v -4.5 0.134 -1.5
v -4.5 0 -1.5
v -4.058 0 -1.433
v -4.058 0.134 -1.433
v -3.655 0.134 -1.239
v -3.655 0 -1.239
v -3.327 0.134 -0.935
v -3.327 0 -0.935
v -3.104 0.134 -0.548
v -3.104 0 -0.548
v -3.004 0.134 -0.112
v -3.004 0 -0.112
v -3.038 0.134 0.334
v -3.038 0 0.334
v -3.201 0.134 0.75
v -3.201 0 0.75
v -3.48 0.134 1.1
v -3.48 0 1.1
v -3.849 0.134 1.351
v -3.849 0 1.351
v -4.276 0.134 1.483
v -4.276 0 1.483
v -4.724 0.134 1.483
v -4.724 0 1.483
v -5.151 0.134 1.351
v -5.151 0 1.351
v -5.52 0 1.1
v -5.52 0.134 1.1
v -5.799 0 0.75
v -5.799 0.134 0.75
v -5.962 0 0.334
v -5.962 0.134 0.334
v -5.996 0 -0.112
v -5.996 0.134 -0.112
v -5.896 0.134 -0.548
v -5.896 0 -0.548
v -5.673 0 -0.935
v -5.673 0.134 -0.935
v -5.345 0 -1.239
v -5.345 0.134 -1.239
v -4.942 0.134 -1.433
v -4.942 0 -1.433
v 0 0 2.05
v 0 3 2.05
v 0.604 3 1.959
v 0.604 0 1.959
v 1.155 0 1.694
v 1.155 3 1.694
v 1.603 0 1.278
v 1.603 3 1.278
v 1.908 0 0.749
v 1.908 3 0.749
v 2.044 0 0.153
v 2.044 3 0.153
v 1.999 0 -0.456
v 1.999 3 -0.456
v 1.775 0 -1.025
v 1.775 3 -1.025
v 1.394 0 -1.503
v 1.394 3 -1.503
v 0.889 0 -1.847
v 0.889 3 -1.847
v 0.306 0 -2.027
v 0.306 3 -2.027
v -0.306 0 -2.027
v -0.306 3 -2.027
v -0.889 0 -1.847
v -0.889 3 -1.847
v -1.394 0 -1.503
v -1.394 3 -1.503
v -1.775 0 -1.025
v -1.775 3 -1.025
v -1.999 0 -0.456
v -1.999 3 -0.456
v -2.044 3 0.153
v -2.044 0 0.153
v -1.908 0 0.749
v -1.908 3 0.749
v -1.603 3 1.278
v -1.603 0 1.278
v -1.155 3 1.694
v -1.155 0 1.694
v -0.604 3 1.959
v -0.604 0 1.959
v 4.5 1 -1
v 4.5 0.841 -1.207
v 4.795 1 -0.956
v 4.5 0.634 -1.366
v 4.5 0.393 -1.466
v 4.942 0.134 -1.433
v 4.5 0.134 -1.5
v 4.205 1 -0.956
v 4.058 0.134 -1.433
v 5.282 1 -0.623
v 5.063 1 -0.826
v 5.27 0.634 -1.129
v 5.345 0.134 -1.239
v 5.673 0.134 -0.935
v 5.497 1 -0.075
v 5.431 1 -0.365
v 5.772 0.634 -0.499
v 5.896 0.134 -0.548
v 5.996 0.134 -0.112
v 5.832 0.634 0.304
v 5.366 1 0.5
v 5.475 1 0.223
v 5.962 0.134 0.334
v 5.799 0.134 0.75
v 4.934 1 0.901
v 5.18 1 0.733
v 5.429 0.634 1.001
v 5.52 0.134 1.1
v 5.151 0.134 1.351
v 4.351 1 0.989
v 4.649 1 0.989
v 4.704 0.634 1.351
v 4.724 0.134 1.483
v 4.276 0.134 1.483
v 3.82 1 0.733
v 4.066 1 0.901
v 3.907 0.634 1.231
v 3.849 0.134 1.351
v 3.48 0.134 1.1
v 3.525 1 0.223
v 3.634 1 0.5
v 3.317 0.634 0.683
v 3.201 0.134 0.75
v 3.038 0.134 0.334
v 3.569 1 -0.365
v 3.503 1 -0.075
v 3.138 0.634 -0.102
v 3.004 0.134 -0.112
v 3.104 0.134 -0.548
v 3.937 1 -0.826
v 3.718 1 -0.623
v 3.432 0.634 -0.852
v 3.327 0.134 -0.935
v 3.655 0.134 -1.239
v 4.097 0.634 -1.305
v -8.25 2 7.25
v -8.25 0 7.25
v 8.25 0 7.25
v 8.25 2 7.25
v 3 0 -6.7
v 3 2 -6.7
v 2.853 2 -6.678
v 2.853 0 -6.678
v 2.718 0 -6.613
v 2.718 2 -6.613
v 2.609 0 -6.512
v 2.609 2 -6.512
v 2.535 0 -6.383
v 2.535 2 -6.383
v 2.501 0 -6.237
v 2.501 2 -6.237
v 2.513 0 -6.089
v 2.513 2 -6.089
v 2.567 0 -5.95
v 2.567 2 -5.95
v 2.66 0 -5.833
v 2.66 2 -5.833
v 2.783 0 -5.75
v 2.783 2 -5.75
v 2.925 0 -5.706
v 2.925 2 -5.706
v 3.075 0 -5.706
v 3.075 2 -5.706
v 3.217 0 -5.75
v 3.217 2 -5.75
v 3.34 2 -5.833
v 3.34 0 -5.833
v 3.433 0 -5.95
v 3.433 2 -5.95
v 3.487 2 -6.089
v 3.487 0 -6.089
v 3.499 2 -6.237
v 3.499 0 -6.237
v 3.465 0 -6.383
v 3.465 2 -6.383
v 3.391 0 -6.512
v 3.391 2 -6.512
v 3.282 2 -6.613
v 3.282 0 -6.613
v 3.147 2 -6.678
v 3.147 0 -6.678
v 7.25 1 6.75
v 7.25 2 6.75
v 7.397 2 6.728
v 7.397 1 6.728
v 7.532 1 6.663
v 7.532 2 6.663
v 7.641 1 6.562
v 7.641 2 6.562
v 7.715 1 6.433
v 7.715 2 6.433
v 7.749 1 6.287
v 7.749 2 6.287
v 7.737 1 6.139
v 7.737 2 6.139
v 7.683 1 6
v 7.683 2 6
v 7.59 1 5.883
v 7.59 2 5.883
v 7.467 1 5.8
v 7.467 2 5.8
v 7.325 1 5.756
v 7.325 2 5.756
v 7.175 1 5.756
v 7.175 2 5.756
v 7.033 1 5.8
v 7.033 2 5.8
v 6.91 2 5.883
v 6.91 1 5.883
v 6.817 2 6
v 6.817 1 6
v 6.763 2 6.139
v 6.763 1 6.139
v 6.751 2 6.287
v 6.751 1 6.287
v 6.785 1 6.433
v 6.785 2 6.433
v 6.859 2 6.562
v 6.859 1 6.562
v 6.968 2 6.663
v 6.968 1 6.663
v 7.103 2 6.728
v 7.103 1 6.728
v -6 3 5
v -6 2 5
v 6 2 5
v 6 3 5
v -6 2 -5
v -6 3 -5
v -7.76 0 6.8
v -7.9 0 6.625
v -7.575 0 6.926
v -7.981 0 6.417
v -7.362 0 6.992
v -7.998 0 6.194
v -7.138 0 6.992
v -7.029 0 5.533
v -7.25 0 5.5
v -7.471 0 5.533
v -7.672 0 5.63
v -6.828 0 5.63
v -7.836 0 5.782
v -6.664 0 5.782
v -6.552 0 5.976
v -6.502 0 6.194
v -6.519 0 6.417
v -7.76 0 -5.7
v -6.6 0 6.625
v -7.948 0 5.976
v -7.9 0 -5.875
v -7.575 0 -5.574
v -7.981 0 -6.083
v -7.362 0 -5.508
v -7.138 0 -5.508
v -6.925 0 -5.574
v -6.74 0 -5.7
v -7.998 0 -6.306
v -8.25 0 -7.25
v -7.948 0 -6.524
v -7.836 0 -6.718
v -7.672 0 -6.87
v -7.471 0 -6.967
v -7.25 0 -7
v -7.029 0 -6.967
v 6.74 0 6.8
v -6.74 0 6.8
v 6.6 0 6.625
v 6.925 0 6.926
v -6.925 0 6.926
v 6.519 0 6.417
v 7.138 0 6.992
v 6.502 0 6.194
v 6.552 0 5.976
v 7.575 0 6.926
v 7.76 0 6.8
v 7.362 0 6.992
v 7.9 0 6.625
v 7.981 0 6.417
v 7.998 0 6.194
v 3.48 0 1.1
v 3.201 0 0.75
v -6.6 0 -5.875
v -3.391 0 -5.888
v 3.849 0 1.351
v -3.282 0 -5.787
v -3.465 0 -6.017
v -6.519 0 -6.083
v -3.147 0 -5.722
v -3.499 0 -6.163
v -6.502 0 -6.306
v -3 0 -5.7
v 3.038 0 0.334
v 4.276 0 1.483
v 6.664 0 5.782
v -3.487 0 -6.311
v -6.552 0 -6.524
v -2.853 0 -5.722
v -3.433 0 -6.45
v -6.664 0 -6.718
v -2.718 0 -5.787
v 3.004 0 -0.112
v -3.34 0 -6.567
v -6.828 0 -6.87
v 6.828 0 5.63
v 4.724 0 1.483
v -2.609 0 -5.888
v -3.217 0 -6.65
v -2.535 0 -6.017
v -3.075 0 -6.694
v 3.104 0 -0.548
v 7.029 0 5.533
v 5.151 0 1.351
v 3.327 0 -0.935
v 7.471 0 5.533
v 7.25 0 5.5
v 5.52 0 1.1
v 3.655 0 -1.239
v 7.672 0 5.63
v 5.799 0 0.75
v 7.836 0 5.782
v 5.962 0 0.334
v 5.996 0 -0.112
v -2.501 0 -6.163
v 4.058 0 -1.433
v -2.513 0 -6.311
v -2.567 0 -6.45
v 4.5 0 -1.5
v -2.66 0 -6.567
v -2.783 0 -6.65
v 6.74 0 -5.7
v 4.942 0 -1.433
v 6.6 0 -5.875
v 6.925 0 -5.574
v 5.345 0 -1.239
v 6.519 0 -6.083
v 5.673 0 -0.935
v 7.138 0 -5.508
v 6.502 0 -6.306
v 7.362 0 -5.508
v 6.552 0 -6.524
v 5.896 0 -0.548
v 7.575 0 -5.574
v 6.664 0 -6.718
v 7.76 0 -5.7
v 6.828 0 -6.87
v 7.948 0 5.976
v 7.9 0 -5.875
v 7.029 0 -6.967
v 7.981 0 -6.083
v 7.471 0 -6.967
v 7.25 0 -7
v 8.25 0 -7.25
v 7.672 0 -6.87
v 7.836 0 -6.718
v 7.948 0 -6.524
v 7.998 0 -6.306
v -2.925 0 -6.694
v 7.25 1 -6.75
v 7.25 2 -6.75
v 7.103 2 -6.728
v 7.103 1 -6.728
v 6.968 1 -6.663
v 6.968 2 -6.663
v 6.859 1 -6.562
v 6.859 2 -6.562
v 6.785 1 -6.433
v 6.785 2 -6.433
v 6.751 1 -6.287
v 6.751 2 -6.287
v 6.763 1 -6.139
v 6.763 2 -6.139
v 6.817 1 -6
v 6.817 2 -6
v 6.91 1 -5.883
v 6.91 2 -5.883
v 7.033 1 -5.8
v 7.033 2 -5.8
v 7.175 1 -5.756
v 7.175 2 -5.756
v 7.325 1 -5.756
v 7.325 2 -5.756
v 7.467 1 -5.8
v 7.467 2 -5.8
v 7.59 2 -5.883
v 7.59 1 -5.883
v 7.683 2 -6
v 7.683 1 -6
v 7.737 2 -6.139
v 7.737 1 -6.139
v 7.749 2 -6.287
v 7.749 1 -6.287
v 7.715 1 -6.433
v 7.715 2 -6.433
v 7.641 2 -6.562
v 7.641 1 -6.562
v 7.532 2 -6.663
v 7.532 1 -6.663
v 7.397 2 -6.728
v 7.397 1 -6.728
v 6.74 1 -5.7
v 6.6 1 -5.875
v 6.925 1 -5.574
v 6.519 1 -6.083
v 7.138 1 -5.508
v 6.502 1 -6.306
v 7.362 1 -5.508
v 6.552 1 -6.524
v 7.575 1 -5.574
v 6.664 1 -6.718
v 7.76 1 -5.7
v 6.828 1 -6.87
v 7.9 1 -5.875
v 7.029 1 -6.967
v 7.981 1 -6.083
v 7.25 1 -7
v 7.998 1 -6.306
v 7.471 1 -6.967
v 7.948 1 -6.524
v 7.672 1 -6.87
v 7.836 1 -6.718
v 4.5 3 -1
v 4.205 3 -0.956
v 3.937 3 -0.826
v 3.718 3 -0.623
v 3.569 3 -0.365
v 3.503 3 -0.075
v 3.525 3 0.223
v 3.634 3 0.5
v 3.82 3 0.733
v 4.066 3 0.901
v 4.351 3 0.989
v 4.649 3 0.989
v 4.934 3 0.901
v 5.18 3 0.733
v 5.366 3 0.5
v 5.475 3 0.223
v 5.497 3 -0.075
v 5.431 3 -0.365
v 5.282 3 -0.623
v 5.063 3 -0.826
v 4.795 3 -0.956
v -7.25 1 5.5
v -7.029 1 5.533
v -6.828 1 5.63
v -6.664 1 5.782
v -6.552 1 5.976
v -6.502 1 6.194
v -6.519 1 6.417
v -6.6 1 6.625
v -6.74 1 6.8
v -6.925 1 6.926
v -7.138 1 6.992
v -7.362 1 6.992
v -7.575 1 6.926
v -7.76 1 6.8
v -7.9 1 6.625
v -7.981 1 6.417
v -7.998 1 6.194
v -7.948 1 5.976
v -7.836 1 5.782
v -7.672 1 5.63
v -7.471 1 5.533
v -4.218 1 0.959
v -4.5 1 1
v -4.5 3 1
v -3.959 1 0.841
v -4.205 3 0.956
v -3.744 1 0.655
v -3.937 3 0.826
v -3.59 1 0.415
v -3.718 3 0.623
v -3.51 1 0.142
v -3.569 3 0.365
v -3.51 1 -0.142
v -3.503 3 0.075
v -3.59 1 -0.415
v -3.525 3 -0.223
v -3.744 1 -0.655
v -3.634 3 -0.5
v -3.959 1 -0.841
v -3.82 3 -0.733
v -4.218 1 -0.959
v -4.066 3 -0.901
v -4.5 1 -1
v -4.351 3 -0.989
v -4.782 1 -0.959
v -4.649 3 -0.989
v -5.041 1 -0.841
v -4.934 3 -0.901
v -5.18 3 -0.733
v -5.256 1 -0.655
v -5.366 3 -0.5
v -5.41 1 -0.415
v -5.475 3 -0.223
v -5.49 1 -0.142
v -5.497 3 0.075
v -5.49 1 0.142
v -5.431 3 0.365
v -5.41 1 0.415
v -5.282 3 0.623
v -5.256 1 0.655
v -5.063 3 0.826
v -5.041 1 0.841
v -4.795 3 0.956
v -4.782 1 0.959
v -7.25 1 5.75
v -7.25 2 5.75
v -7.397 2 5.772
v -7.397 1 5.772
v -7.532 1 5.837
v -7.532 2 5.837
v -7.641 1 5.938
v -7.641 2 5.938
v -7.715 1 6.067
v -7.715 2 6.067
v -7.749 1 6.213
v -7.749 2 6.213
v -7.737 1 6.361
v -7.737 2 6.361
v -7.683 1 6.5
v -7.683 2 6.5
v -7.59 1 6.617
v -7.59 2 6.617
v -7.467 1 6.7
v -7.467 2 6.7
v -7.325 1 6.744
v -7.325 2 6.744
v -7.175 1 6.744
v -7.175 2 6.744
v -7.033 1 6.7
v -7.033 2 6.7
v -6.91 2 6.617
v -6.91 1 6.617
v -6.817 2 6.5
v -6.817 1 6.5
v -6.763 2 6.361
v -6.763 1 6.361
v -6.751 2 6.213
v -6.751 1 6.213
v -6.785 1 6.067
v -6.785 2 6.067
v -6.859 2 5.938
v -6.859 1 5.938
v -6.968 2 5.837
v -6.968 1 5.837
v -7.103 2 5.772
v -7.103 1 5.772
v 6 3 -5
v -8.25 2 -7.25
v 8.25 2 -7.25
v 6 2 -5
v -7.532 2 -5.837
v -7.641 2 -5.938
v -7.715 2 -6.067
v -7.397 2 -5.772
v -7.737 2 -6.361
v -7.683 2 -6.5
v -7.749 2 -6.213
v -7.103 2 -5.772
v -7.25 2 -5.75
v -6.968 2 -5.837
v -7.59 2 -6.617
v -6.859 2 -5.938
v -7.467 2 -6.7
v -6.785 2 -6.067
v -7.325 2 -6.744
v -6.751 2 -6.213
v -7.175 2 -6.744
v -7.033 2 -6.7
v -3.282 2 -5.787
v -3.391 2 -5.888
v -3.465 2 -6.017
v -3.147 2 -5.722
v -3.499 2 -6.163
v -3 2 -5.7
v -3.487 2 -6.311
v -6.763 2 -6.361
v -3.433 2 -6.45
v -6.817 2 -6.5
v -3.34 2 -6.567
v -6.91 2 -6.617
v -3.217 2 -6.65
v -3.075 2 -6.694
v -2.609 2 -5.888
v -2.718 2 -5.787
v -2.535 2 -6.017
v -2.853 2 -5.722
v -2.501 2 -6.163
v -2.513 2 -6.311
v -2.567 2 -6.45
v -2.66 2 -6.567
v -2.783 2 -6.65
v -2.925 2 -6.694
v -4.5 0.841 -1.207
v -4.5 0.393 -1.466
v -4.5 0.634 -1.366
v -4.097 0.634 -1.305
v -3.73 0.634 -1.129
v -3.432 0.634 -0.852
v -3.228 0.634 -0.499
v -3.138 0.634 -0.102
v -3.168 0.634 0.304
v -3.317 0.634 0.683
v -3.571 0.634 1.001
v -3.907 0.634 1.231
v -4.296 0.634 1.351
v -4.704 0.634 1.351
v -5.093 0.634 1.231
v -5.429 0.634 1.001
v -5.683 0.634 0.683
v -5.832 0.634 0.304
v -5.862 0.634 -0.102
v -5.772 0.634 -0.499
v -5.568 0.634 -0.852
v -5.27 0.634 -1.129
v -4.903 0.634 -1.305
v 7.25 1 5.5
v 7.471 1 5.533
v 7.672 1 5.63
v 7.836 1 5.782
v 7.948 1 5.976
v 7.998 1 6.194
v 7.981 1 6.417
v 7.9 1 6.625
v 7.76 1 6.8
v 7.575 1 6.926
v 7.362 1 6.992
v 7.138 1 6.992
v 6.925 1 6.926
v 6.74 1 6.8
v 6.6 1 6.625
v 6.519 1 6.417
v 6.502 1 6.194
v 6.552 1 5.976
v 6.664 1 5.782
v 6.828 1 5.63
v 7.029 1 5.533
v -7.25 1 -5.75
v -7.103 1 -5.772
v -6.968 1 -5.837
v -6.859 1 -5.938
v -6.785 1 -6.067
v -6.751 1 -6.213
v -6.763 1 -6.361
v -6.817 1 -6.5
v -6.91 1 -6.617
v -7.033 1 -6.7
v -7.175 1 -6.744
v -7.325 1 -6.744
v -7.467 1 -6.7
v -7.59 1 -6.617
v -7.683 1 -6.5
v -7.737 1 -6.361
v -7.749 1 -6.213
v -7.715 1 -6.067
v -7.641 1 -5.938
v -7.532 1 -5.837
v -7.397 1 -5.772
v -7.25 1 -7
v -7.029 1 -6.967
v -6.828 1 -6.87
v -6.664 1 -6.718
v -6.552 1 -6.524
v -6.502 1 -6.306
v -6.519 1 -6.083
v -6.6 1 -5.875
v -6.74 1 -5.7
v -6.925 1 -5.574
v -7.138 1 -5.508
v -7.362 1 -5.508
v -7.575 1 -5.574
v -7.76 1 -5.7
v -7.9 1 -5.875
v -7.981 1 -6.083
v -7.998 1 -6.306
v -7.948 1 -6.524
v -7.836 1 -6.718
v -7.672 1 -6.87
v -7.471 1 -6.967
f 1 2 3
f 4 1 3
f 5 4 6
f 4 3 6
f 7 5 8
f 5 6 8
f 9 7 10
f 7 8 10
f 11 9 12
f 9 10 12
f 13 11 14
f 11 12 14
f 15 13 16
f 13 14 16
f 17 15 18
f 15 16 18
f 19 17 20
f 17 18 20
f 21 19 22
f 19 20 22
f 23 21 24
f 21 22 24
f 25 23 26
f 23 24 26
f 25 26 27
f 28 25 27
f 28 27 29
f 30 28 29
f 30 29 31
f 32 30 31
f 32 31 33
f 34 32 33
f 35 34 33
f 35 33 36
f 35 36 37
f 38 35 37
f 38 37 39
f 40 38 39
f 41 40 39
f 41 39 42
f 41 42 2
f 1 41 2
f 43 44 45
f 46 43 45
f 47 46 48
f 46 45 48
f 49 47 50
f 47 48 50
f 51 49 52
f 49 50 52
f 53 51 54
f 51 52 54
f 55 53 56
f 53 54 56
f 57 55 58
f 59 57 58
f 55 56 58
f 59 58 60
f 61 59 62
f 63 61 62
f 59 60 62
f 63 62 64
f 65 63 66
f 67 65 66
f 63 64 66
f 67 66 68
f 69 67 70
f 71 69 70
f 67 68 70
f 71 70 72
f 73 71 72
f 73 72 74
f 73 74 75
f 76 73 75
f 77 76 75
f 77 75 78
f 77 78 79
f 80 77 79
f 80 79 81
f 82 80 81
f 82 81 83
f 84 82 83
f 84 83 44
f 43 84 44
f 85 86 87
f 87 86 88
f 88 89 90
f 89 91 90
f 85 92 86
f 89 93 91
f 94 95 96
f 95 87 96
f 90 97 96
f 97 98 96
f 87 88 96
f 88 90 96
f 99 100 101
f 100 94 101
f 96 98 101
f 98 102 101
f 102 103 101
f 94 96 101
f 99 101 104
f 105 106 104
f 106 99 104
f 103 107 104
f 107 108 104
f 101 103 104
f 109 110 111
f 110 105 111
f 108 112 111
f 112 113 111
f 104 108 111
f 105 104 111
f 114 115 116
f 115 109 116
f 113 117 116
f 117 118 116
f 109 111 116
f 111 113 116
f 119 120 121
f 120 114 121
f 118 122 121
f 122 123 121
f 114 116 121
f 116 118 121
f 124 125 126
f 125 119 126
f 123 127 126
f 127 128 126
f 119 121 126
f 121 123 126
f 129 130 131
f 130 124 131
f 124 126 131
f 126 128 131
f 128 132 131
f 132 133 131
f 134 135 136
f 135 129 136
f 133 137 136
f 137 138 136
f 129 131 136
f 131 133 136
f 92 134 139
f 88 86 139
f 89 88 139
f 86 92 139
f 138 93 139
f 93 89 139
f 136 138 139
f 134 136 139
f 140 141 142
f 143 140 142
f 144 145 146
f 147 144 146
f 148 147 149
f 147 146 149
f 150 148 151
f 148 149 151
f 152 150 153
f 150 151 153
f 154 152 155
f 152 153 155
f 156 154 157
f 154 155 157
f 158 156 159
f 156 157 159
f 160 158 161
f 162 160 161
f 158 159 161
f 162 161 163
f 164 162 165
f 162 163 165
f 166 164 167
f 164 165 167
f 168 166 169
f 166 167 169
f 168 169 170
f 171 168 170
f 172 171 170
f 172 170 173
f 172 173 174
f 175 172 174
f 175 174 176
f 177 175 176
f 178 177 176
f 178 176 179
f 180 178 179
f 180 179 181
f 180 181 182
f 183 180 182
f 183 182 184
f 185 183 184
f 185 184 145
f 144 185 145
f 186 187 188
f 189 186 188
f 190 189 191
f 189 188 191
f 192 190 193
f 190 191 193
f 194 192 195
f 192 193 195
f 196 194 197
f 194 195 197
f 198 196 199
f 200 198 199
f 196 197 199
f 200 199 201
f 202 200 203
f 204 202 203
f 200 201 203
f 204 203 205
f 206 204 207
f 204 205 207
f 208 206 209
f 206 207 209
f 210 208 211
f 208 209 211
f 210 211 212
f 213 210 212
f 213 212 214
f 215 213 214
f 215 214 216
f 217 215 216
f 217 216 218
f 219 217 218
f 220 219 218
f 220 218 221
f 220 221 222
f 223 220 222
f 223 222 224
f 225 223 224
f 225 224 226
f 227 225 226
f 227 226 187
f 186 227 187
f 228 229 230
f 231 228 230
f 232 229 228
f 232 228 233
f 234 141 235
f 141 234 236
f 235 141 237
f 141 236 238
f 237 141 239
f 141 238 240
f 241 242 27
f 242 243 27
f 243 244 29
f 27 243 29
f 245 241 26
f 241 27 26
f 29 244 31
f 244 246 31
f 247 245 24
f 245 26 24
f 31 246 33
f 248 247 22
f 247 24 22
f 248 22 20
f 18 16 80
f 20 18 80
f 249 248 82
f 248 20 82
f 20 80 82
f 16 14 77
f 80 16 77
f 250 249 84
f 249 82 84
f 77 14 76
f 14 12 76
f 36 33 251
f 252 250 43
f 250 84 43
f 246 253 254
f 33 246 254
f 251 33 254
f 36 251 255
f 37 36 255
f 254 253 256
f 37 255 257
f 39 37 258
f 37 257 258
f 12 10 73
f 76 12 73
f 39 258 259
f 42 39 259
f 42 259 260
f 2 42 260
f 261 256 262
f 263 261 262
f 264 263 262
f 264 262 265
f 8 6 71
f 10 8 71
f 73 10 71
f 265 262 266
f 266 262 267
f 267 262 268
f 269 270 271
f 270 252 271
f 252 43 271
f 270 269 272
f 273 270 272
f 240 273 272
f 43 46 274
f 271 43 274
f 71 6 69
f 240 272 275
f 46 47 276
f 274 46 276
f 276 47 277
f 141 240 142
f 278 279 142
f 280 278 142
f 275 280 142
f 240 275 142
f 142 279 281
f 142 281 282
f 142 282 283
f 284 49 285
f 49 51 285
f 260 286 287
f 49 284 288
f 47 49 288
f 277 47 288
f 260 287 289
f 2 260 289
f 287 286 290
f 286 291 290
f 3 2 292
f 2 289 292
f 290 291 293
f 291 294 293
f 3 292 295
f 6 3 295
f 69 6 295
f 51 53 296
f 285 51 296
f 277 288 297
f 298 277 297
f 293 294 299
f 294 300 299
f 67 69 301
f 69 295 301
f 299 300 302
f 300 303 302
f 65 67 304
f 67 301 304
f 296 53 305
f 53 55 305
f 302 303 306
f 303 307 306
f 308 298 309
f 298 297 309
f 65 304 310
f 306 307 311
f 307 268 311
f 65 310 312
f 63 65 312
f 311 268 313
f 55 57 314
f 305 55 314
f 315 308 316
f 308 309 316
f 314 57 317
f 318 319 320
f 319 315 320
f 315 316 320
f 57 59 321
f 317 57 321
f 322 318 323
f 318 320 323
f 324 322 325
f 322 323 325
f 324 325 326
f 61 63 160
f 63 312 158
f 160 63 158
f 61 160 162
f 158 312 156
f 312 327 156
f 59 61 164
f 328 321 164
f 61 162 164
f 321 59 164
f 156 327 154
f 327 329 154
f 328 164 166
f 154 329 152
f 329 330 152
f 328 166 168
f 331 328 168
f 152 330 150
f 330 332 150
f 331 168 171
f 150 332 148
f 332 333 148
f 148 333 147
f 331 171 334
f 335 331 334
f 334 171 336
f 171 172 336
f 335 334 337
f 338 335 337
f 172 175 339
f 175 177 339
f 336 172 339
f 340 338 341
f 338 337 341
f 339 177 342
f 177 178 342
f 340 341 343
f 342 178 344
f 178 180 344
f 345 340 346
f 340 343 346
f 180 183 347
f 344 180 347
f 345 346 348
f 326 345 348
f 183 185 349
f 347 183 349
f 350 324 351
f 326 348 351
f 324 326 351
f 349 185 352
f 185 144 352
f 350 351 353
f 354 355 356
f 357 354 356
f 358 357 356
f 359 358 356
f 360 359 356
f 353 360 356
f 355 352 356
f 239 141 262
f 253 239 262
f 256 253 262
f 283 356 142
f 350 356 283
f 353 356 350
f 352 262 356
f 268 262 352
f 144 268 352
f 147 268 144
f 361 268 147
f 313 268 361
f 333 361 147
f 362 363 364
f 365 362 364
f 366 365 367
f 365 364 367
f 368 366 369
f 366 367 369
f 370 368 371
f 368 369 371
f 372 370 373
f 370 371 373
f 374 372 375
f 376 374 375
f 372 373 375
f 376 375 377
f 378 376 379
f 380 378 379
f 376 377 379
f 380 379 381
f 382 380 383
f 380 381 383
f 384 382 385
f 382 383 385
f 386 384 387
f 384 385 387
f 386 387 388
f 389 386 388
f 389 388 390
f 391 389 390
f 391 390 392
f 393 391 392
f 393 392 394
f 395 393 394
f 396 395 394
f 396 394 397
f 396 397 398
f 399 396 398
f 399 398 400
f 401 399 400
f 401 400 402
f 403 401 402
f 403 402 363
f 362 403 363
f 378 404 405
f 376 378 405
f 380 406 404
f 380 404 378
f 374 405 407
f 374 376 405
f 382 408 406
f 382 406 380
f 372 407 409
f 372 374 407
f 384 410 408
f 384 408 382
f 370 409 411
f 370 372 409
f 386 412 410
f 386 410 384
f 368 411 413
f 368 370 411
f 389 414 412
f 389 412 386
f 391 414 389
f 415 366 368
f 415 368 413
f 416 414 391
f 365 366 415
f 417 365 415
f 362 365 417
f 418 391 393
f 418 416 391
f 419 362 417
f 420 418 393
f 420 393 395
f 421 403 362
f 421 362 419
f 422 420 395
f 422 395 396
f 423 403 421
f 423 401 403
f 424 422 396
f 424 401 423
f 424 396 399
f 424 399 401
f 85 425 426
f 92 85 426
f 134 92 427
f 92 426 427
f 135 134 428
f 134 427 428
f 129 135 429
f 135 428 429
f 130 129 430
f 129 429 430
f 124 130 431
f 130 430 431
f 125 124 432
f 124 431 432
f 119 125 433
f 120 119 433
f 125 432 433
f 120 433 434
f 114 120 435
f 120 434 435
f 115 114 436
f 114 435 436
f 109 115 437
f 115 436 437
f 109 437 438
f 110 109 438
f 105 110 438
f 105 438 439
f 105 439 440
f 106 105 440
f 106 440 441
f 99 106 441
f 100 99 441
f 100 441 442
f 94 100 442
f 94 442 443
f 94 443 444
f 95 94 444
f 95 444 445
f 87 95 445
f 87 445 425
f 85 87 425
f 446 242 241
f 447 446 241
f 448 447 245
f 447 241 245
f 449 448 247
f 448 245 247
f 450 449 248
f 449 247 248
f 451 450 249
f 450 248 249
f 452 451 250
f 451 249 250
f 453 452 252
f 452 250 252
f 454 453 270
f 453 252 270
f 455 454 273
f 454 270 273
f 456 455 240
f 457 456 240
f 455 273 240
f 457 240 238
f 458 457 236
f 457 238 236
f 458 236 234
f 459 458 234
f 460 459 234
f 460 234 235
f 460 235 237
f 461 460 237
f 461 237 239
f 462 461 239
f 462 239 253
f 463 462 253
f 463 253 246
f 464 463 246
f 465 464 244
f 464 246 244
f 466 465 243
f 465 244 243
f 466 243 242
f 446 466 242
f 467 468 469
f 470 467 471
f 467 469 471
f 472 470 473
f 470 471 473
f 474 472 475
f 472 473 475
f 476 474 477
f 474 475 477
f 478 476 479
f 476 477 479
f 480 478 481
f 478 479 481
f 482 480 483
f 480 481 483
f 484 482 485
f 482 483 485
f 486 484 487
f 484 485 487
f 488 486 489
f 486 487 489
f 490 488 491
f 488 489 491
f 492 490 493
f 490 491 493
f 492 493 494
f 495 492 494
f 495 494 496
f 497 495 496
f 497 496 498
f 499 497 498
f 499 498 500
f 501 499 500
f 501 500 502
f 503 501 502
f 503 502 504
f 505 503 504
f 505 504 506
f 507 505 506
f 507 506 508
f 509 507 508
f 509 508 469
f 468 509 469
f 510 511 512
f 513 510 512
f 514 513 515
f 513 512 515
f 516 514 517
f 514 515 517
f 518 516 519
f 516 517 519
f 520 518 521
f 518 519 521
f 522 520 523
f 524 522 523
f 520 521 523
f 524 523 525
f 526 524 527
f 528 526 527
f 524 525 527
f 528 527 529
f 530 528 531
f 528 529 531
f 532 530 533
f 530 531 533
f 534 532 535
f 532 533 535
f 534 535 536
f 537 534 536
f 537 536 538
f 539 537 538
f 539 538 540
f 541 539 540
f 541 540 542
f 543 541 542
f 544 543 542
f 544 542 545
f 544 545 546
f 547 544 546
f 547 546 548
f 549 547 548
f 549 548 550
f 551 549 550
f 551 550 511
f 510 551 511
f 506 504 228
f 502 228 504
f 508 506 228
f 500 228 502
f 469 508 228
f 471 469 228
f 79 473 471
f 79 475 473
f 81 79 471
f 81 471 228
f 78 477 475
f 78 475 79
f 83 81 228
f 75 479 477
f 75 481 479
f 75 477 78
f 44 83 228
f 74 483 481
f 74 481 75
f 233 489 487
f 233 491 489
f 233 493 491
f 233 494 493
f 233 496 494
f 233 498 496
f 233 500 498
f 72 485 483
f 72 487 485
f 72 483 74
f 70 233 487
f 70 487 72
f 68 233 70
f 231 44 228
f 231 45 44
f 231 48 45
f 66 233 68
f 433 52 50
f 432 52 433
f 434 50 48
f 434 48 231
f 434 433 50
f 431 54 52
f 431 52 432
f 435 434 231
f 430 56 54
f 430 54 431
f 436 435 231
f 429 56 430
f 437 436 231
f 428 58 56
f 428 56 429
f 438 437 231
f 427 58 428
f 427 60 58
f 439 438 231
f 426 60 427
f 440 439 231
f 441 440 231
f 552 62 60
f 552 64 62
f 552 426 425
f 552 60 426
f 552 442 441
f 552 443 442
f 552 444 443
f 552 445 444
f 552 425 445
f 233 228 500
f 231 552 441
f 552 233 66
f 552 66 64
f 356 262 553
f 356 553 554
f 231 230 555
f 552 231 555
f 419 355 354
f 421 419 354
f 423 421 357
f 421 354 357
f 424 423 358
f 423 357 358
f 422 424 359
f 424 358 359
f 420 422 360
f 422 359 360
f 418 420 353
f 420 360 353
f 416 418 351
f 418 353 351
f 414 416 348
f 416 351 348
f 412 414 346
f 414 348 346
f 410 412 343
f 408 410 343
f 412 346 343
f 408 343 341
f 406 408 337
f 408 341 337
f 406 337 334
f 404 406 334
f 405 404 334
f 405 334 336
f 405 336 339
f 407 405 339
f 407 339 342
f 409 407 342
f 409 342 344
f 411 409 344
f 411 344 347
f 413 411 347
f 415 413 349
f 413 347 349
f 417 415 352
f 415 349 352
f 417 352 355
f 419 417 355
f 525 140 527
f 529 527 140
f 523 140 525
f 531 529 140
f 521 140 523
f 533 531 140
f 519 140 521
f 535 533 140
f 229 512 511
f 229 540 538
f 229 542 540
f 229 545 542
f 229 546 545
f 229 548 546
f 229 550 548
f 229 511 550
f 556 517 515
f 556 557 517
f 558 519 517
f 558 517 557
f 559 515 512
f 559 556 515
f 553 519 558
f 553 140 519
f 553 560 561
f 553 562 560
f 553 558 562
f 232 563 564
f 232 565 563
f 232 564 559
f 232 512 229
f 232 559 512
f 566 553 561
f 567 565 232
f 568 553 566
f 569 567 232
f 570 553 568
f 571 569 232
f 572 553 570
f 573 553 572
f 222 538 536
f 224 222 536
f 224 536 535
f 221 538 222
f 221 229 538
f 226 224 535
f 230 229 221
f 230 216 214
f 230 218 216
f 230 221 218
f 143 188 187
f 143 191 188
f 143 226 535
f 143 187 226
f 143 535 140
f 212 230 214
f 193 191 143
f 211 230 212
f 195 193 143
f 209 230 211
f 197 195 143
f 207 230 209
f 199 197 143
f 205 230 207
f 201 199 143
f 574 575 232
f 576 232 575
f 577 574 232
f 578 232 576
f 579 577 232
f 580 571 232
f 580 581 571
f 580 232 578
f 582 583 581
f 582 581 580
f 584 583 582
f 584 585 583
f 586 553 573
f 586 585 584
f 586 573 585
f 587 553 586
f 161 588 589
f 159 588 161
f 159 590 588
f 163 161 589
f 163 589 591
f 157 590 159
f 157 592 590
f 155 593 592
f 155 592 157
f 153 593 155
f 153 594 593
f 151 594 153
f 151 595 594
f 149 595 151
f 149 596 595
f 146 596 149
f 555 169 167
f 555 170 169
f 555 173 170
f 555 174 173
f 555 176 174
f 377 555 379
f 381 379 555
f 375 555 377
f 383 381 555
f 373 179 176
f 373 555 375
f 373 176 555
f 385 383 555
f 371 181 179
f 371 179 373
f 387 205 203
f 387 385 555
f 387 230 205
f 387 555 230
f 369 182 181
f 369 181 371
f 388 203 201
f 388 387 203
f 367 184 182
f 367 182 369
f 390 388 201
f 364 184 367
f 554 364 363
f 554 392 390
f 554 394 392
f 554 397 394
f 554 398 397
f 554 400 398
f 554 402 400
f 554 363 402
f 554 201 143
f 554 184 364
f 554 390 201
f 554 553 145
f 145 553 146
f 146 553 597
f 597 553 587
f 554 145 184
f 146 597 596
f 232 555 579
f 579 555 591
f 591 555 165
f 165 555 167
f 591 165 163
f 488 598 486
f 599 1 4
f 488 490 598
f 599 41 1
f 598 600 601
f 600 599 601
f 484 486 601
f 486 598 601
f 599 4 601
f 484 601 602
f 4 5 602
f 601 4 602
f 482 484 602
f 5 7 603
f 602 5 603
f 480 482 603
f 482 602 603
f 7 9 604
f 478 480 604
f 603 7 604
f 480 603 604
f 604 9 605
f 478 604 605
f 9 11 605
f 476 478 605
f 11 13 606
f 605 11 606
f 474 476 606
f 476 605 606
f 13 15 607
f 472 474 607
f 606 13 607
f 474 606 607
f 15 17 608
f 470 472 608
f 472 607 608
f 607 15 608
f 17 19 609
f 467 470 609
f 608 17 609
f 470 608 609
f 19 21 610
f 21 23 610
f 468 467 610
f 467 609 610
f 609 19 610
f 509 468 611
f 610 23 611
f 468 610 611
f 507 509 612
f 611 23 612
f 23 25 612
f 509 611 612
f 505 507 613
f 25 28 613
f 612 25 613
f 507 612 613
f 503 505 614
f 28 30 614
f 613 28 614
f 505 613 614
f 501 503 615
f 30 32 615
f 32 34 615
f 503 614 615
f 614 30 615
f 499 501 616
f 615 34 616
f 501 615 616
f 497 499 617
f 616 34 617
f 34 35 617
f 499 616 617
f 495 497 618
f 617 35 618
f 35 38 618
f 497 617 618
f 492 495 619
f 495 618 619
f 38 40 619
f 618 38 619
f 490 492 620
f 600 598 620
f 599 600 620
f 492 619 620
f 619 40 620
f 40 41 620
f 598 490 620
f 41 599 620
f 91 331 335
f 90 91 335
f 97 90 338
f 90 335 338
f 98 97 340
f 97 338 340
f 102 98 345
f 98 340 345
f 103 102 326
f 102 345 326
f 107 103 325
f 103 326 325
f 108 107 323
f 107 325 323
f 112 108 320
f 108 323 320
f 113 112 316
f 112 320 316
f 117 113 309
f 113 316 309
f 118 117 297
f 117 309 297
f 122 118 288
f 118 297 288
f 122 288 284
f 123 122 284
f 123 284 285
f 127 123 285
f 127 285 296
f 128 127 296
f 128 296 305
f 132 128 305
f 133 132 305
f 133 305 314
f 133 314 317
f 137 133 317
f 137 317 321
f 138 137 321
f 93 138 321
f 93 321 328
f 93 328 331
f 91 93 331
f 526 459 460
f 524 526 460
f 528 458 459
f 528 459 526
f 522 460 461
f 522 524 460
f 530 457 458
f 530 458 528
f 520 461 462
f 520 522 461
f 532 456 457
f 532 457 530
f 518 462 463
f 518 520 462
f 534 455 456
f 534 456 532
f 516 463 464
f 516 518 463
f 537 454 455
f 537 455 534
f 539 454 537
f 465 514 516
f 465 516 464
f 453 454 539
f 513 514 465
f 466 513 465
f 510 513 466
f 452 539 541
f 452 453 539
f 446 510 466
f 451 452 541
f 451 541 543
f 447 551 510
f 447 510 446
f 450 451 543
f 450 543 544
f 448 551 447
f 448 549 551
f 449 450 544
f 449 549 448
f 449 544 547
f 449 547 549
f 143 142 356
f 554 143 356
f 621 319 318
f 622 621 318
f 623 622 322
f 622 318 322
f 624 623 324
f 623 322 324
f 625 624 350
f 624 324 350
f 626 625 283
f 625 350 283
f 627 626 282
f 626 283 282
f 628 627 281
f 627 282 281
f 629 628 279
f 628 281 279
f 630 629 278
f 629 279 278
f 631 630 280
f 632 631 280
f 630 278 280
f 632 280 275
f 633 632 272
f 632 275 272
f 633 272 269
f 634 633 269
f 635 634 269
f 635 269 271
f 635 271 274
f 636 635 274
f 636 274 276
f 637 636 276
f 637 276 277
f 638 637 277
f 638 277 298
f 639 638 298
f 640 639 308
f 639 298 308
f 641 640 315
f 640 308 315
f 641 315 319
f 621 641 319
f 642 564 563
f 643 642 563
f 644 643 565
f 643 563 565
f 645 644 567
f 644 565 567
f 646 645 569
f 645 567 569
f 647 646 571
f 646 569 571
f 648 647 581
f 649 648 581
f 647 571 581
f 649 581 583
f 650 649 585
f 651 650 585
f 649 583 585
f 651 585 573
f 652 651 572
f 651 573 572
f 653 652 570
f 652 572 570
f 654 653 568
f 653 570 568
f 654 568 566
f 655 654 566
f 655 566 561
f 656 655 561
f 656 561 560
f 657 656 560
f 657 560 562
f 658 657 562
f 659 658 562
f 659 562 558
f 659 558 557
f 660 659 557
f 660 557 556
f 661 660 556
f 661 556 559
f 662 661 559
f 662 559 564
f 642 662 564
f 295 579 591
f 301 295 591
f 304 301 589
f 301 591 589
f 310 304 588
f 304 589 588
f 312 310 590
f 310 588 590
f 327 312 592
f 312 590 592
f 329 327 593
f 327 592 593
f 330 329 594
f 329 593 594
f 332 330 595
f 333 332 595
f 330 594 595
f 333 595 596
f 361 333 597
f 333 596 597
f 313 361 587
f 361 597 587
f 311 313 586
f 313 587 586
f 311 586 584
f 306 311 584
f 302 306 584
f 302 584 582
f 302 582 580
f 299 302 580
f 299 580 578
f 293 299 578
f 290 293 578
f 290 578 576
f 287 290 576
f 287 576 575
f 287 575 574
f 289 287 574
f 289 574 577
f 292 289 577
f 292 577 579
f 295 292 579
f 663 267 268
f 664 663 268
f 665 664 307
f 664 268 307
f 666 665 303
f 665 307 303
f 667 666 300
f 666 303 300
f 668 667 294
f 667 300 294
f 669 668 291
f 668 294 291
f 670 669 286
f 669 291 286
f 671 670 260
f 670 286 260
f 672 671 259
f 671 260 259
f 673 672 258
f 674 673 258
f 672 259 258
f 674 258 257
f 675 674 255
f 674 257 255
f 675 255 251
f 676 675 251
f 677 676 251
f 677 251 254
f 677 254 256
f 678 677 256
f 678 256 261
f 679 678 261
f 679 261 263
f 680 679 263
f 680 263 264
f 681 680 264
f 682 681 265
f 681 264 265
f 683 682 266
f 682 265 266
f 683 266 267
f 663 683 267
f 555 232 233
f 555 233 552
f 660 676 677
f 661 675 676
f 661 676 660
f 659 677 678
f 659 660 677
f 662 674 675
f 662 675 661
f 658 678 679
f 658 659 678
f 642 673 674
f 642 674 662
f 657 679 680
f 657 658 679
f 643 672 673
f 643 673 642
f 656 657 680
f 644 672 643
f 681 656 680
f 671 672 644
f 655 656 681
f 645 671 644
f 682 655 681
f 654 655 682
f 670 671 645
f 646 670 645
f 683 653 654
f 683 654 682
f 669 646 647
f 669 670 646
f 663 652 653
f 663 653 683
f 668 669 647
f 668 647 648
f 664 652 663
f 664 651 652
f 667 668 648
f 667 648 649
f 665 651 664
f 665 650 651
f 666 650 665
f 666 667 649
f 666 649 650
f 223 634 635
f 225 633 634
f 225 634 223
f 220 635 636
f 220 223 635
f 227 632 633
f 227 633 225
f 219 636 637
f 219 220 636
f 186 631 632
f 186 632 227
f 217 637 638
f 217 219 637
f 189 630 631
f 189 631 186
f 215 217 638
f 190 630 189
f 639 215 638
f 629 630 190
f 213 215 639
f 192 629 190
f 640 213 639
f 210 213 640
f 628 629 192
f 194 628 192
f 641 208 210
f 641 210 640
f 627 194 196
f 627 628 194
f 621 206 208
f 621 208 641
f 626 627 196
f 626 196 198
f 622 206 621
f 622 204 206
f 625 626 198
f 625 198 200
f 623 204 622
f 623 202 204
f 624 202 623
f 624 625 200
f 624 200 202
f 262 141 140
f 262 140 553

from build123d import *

# Parameters (mm, degrees)
SKETCH_1_W          = 16.5
SKETCH_1_H          = 14.5
EXTRUDE_1_DEPTH     = 2
SKETCH_2_W          = 12
SKETCH_2_H          = 10
EXTRUDE_2_DEPTH     = 1
SKETCH_3_R          = 0.5
CUT_EXTRUDE_1_DEPTH = 12.163556781
SKETCH_5_R          = 2.05
SKETCH_5_R_2        = 1
CUT_EXTRUDE_2_DEPTH = 12.385297537
SKETCH_6_R          = 0.75
CUT_EXTRUDE_3_DEPTH = 1
SKETCH_7_R          = 1.5
CUT_EXTRUDE_4_DEPTH = 1
FILLET_1_R          = 1
SKETCH_8_R          = 0.5
CUT_EXTRUDE_5_DEPTH = 12.163556781


with BuildPart() as part:
    # 草图1 → 凸台-拉伸1 (new body)
    with BuildSketch(Plane(origin=(0, 0, 0), x_dir=(1, 0, 0), z_dir=(0, 1, 0))):
        Rectangle(SKETCH_1_W, SKETCH_1_H)
    extrude(amount=EXTRUDE_1_DEPTH)

    # 草图2 → 凸台-拉伸2 (add)
    with BuildSketch(Plane(origin=(0, 2, 0), x_dir=(1, 0, 0), z_dir=(0, 1, 0))):
        Rectangle(SKETCH_2_W, SKETCH_2_H)
    extrude(amount=EXTRUDE_2_DEPTH)

    # 草图3 → 切除-拉伸1 (cut, through all)
    with BuildSketch(Plane(origin=(0, 2, 0), x_dir=(1, 0, 0), z_dir=(0, 1, 0))):
        with Locations(Location((-7.25, 6.25, 0), (0, 0, 270))):
            Circle(SKETCH_3_R)
        with Locations(Location((7.25, 6.25, 0), (0, 0, 90))):
            Circle(SKETCH_3_R)
        with Locations(Location((7.25, -6.25, 0), (0, 0, 270))):
            Circle(SKETCH_3_R)
        with Locations(Location((-7.25, -6.25, 0), (0, 0, 90))):
            Circle(SKETCH_3_R)
    extrude(amount=-CUT_EXTRUDE_1_DEPTH, mode=Mode.SUBTRACT)

    # 草图5 → 切除-拉伸2 (cut, through all)
    with BuildSketch(Plane(origin=(0, 3, 0), x_dir=(1, 0, 0), z_dir=(0, 1, 0))):
        with Locations(Location((0, 0, 0), (0, 0, 270))):
            Circle(SKETCH_5_R)
        with Locations(Location((-4.5, 0, 0), (0, 0, 270))):
            Circle(SKETCH_5_R_2)
        with Locations(Location((4.5, 0, 0), (0, 0, 90))):
            Circle(SKETCH_5_R_2)
    extrude(amount=-CUT_EXTRUDE_2_DEPTH, mode=Mode.SUBTRACT)

    # 草图6 → 切除-拉伸3 (cut)
    with BuildSketch(Plane.XZ):
        with Locations(Location((7.25, -6.25, 0), (0, 0, 270))):
            Circle(SKETCH_6_R)
        with Locations(Location((-7.25, -6.25, 0), (0, 0, 270))):
            Circle(SKETCH_6_R)
        with Locations(Location((7.25, 6.25, 0), (0, 0, 270))):
            Circle(SKETCH_6_R)
        with Locations(Location((-7.25, 6.25, 0), (0, 0, 270))):
            Circle(SKETCH_6_R)
    extrude(amount=-CUT_EXTRUDE_3_DEPTH, mode=Mode.SUBTRACT)

    # 草图7 → 切除-拉伸4 (cut)
    with BuildSketch(Plane.XZ):
        with Locations(Location((-4.5, 0, 0), (0, 0, 270))):
            Circle(SKETCH_7_R)
        with Locations(Location((4.5, 0, 0), (0, 0, 270))):
            Circle(SKETCH_7_R)
    extrude(amount=-CUT_EXTRUDE_4_DEPTH, mode=Mode.SUBTRACT)

    # 圆角1
    # the kernel refuses this fillet: 1 mm, written as the material it adds along each edge
    with BuildSketch(Plane(origin=(-4.5, 1, 0), x_dir=(0, 0, -1), z_dir=(-1, 0, 0))) as fillet_1_piece_1_section:
        with BuildLine():
            CenterArc((0.5, 0.866025404), FILLET_1_R, 300, 60)
            Line((1, 0), (1.01, -0.017320508))
            ThreePointArc((1.01, -0.017320508), (1.25, -0.02), (1.5, -0.02))
            Line((1.5, -0.02), (1.52, 0))
            Line((1.52, 0), (1.52, 0.866025404))
            Line((1.52, 0.866025404), (1.5, 0.866025404))
        make_face()
    fillet_1_piece_1 = revolve(axis=Axis((-4.5, 1, 0), (0, -1, 0)), mode=Mode.PRIVATE)
    fillet_1_piece_1 = fillet_1_piece_1 - Plane(origin=(-4.5, 0.639457319, 0), x_dir=(0, 0, 1), z_dir=(0, 1, 0)) * Cylinder(1, 7, mode=Mode.PRIVATE)
    add(fillet_1_piece_1)
    with BuildSketch(Plane(origin=(4.5, 1, 0), x_dir=(0, 0, -1), z_dir=(-1, 0, 0))) as fillet_1_piece_2:
        with BuildLine():
            CenterArc((0.5, 0.866025404), FILLET_1_R, 300, 60)
            Line((1, 0), (1.01, -0.017320508))
            ThreePointArc((1.01, -0.017320508), (1.25, -0.02), (1.5, -0.02))
            Line((1.5, -0.02), (1.52, 0))
            Line((1.52, 0), (1.52, 0.866025404))
            Line((1.52, 0.866025404), (1.5, 0.866025404))
        make_face()
    revolve(axis=Axis((4.5, 1, 0), (0, -1, 0)))

    # 草图8 → 切除-拉伸5 (cut, through all)
    with BuildSketch(Plane(origin=(0, 2, 0), x_dir=(1, 0, 0), z_dir=(0, 1, 0))):
        with Locations(Location((-3, 6.2, 0), (0, 0, 270))):
            Circle(SKETCH_8_R)
        with Locations(Location((3, 6.2, 0), (0, 0, 90))):
            Circle(SKETCH_8_R)
    extrude(amount=-CUT_EXTRUDE_5_DEPTH, mode=Mode.SUBTRACT)


solid = part.part
